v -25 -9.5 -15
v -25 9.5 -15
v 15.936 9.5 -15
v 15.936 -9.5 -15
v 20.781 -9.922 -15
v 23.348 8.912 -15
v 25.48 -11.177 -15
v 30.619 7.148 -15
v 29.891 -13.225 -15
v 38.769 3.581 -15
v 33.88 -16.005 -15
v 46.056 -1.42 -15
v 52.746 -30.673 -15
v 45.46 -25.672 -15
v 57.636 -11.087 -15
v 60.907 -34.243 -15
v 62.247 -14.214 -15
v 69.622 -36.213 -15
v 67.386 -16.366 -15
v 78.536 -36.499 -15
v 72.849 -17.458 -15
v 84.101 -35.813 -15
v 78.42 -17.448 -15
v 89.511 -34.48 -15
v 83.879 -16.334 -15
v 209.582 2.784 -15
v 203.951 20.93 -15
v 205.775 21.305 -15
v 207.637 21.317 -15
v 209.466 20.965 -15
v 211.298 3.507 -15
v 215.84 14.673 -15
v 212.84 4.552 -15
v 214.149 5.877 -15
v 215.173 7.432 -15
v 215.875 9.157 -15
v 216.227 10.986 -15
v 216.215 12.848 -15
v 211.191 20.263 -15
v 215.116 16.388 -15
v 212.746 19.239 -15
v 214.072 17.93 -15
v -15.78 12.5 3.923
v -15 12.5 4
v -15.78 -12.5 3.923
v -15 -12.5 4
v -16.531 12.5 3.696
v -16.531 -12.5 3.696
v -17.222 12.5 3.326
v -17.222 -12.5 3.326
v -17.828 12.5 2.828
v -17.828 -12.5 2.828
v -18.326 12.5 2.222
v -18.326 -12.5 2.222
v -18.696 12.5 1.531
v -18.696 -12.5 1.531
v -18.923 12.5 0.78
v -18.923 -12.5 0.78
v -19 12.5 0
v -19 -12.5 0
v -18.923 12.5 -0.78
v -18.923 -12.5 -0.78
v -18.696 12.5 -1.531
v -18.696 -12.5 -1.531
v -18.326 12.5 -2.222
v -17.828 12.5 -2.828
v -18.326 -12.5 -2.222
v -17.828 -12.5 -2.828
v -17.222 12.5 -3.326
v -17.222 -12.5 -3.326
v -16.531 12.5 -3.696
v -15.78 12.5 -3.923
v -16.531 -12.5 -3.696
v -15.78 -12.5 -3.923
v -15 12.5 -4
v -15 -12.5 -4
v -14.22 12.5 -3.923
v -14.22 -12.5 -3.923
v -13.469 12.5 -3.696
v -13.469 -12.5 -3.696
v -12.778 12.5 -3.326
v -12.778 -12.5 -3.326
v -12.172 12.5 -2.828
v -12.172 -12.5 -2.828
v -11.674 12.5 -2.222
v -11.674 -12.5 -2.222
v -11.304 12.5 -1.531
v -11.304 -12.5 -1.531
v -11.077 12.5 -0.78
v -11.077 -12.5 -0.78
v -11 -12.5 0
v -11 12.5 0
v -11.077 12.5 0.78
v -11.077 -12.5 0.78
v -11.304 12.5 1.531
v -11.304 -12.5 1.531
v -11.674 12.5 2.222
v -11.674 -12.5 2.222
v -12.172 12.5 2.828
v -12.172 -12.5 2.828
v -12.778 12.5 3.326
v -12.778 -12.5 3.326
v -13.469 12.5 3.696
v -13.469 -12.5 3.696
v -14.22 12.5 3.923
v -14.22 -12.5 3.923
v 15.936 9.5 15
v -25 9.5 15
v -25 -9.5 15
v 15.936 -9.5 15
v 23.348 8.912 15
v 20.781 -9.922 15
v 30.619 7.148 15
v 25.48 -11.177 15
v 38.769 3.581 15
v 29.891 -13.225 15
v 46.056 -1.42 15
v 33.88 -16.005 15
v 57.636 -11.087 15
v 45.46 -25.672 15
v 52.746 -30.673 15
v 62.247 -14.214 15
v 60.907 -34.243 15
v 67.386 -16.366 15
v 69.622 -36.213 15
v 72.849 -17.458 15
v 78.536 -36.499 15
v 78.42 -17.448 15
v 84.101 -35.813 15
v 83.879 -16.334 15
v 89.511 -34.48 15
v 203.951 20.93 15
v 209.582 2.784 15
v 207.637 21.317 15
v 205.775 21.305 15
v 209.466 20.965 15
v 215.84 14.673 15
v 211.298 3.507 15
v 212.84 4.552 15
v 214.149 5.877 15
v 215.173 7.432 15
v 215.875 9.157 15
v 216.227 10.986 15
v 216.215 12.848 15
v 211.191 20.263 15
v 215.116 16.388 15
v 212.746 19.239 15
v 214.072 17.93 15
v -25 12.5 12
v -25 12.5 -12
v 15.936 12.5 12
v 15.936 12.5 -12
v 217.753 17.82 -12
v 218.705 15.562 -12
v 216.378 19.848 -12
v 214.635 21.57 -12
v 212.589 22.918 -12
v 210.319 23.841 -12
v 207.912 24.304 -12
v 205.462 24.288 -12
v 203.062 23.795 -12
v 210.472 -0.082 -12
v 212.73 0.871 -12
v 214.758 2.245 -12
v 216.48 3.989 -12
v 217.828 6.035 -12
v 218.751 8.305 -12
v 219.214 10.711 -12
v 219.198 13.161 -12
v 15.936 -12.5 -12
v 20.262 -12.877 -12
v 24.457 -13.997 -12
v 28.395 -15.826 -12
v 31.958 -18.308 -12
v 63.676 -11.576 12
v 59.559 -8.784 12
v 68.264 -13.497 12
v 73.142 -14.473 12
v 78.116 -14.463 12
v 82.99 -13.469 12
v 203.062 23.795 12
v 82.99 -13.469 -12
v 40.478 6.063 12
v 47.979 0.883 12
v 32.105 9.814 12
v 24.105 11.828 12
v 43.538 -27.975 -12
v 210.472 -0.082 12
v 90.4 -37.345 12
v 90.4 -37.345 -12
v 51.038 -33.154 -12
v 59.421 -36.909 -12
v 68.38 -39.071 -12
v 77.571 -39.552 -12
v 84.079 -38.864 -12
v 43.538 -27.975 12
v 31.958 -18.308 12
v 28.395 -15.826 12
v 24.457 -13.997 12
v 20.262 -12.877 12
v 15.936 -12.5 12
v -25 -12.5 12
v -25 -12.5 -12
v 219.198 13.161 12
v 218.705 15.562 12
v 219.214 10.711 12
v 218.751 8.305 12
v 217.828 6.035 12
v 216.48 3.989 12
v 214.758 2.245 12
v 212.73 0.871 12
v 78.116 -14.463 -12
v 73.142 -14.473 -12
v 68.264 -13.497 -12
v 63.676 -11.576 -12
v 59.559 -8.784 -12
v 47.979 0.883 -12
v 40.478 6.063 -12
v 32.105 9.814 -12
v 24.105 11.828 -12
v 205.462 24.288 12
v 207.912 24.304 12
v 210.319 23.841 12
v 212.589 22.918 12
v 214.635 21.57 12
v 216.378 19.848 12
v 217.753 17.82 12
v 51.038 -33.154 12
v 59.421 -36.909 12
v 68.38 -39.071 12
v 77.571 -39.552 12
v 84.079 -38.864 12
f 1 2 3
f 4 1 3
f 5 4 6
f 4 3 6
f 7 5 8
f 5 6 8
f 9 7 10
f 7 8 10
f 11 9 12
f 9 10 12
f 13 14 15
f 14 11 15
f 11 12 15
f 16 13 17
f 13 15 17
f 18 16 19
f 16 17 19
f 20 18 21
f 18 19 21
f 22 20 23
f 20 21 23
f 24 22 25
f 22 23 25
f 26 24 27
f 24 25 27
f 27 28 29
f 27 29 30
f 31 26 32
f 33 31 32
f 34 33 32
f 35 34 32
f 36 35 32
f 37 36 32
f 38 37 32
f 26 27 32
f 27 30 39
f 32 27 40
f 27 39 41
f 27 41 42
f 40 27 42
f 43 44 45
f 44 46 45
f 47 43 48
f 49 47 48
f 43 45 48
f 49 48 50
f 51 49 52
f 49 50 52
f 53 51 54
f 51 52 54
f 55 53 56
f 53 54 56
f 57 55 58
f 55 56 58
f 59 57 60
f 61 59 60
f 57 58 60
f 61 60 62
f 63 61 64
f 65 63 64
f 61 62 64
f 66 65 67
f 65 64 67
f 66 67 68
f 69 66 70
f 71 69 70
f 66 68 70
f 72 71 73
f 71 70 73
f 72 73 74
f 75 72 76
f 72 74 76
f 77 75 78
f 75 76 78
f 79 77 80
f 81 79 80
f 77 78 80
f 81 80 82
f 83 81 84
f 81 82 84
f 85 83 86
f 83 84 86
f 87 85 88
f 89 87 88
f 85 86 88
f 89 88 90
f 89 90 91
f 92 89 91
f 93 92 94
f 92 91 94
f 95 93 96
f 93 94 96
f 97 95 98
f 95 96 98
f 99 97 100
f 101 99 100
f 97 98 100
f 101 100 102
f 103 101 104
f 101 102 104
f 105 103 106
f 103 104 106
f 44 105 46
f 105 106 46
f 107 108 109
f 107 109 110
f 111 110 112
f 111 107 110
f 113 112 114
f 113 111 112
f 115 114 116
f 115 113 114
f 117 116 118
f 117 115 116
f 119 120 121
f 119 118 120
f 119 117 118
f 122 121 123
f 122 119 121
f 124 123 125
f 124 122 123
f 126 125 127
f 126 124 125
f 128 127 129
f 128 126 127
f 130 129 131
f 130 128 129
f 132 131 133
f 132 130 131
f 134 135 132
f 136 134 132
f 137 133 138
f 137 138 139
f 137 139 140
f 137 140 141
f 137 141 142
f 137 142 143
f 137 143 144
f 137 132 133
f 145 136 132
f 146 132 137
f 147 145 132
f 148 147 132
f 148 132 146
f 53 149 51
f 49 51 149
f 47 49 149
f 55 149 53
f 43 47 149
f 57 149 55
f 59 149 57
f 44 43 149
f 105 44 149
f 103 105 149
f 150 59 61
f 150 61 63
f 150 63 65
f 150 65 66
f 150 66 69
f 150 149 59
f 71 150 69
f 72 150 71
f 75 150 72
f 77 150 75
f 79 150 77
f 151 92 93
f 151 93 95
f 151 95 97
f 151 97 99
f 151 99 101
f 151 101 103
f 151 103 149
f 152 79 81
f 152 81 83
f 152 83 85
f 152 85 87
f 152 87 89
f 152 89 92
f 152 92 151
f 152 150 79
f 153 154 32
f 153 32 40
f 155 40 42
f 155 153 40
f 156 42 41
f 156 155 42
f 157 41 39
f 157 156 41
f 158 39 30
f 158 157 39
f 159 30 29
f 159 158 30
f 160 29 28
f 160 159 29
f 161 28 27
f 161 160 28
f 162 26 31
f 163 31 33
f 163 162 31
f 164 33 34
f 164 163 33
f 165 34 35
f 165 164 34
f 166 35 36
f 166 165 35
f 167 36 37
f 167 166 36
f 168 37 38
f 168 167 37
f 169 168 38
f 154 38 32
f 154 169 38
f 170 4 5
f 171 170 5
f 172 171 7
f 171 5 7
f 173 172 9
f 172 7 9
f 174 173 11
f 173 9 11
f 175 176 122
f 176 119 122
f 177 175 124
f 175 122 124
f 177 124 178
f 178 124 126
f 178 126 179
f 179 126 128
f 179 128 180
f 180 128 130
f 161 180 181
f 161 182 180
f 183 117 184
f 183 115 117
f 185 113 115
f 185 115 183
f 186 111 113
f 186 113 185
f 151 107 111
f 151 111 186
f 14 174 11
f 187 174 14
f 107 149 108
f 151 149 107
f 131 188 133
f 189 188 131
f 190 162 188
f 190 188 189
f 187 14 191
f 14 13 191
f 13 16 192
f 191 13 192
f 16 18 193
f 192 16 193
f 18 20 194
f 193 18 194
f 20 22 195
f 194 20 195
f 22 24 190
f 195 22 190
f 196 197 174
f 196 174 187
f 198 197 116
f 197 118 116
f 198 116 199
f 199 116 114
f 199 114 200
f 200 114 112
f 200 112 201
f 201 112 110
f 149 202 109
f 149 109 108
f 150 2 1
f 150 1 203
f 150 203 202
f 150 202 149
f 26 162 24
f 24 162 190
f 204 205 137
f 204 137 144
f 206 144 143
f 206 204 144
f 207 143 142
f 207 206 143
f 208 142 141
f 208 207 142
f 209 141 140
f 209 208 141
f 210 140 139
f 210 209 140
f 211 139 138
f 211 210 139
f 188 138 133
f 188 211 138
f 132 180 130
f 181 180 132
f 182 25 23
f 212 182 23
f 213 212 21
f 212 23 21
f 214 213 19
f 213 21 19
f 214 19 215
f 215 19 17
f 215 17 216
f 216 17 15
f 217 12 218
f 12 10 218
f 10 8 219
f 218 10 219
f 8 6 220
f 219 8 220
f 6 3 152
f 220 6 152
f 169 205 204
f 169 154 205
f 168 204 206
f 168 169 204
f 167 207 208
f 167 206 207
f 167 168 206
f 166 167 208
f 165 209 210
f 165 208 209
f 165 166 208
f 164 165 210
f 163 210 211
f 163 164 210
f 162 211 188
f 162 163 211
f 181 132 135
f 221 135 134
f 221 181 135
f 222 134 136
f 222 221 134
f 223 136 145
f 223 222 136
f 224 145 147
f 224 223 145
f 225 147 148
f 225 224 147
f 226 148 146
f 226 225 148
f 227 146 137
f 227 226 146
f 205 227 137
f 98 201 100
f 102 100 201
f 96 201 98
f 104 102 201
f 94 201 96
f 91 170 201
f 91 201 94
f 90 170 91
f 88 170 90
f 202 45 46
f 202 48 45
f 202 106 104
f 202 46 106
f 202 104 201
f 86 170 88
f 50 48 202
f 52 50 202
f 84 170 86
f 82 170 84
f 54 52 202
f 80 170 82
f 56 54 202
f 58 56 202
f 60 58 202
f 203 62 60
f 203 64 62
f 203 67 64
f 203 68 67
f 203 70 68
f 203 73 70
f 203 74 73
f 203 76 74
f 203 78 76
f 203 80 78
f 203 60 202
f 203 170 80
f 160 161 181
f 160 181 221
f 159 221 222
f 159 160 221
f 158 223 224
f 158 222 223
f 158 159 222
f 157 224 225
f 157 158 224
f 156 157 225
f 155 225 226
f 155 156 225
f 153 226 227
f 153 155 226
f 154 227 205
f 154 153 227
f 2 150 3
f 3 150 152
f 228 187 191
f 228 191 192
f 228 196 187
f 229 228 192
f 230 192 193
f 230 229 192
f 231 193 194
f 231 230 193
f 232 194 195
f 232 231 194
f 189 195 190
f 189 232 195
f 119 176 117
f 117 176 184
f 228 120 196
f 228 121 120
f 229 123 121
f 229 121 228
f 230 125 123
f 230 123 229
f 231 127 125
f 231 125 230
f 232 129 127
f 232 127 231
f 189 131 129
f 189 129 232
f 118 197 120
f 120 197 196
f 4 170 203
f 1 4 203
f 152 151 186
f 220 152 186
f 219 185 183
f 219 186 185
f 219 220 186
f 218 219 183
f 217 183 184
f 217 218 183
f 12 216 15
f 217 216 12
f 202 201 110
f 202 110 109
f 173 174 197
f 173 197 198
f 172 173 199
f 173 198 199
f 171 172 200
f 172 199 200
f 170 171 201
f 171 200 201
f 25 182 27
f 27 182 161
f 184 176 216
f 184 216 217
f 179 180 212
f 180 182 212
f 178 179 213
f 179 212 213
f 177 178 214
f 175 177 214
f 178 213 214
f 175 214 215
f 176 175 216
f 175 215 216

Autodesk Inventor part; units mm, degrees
ref_plane "YZ Plane" through (0, 0, 0) normal (1, 0, 0) x (0, 1, 0)
ref_plane "XZ Plane" through (0, 0, 0) normal (0, 1, 0) x (-1, 0, 0)
ref_plane "XY Plane" through (0, 0, 0) normal (0, 0, 1) x (1, 0, 0)
sketch "Sketch1" plane through (0, 0, 0) normal (0, 0, 1) x (1, 0, 0)
  line L0 (25, -12.5) -> (-25, -12.5)
  line L1 (-25, -12.5) -> (-25, 12.5)
  line L2 (-25, 12.5) -> (25, 12.5)
  line L3 (25, -12.5) -> (-25, 12.5) construction
  line L4 (-25, -12.5) -> (25, 12.5) construction
  line L5 (25, 12.5) -> (70, 12.5) construction
  line L6 (70, 12.5) -> (70, -17.5) construction
  line L7 (70, -17.5) -> (70, 27.5) construction
  line L8 (70, 27.5) -> (215, 27.5) construction
  line L9 (25, -12.5) -> (64.4199, -45.408)
  line L10 (70, -17.5) -> (41.0213, 6.6916)
  line L11 (70, -17.5) -> (215, 27.5)
  line L12 (215, 27.5) -> (222.41, 3.6234)
  line L13 (222.41, 3.6234) -> (77.41, -41.3766)
  line L14 (41.0213, 6.6916) -> (34.0635, 12.5)
  line L15 (25, 12.5) -> (34.0635, 12.5)
  line L16 (77.41, -41.3766) -> (64.4199, -45.408)
  point P0 (0, 0)
  dimension "d3" = 30
  dimension "d5" = 50
  dimension "d6" = 25
  dimension "d7" = 45
  dimension "d8" = 45
  dimension "d9" = 145
  dimension "d12" = 25
  dimension "d13" = 25
extrude "Extrusion1" add sketch "Sketch1" along normal mid plane 30
fillet "Fillet1" radius 50 1 edges at (34.0635, 12.5, 0)
fillet "Fillet2" radius 25 1 edges at (25, -12.5, 0)
fillet "Fillet3" radius 50 1 edges at (64.4199, -45.408, 0)
fillet "Fillet4" radius 25 1 edges at (70, -17.5, 0)
fillet "Fillet5" radius 12.5 2 edges at (215, 27.5, 0) (222.41, 3.6234, 0)
chamfer "Chamfer1" distance 3 angle 45 18 edges at (32.9782, 9.5062, 15) (53.7689, -3.9502, 15) (143.0261, 5.1633, 15) (212.5886, 22.9184, 15) (150.4361, -18.7133, 15) (65.7768, -38.6215, 15) (37.7476, -23.1418, 15) (-4.5318, -12.5, 15) (-4.5318, 12.5, 15) (32.9782, 9.5062, -15) (-4.5318, 12.5, -15) (53.7689, -3.9502, -15) (143.0261, 5.1633, -15) (212.5886, 22.9184, -15) (150.4361, -18.7133, -15) (65.7768, -38.6215, -15) (37.7476, -23.1418, -15) (-4.5318, -12.5, -15)
sketch "Sketch2" plane through (-25, 12.5, -12) normal (0, 1, 0) x (1, 0, 0)
  line L0 (0, 0) -> (0, -24) projected
  point P0 (25, -12)
  point P1 (10, -12)
  dimension "d24" = 10
hole "Hole1" at (-15, 12.5, 0) direction (0, -1, 0) diameter 8 end through all
properties part number "Robot_support"
